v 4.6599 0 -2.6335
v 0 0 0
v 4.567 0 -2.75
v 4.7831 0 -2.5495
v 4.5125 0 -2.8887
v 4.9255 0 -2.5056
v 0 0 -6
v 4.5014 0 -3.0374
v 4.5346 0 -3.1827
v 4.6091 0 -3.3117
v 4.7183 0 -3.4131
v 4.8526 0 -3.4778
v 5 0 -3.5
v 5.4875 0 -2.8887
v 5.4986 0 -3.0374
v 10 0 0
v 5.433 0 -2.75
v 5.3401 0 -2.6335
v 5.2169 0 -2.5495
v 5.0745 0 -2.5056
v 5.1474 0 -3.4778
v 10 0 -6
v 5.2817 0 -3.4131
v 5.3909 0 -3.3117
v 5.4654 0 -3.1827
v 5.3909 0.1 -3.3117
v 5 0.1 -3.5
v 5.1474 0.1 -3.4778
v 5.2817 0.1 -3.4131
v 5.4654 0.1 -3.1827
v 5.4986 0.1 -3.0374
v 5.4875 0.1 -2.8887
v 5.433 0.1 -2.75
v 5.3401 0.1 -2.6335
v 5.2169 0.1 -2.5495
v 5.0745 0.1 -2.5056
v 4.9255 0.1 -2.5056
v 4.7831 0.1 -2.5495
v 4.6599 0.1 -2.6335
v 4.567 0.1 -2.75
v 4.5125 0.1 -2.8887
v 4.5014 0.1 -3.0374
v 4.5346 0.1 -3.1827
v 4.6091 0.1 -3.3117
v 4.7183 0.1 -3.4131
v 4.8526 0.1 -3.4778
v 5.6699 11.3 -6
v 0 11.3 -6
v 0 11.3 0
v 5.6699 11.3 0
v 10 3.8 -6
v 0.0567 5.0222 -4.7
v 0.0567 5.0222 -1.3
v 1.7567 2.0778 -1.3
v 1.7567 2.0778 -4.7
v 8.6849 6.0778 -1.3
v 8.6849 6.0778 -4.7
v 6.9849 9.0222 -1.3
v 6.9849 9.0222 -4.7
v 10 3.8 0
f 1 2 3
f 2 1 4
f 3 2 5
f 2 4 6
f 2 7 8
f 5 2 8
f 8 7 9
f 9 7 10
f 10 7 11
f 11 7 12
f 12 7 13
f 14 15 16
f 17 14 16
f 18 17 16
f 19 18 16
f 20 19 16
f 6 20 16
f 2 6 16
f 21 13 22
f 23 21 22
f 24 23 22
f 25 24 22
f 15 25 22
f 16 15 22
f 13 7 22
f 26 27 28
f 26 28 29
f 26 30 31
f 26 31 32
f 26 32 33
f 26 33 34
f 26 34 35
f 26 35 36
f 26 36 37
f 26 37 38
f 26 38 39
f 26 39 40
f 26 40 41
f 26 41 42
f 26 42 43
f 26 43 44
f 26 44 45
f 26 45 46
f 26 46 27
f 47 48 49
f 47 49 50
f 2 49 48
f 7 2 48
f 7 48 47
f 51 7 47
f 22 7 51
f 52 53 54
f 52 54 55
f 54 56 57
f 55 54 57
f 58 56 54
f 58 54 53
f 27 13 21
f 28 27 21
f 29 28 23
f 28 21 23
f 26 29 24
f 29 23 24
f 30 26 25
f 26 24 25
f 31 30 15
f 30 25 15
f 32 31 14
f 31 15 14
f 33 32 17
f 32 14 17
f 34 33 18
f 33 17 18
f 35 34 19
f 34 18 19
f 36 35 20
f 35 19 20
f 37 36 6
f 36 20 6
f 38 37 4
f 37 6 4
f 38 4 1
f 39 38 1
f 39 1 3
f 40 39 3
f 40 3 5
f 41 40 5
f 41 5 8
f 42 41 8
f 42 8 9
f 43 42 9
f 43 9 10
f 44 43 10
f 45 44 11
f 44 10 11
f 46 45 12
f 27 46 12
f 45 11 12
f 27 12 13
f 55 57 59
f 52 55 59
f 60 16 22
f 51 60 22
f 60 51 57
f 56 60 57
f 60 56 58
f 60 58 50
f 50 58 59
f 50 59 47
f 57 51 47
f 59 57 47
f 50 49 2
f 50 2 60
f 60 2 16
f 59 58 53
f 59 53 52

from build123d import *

# Parameters (mm, degrees)
SKETCH_1_W          = 10
SKETCH_1_H          = 6
EXTRUDE_1_DEPTH     = 11.3
CUT_EXTRUDE_1_REACH = 18.239
SKETCH_3_W          = 3.4
SKETCH_3_H          = 3.4
CUT_EXTRUDE_2_DEPTH = 8
SKETCH_4_R          = 0.5
CUT_EXTRUDE_3_DEPTH = 0.1


with BuildPart() as part:
    # 草图1 → 凸台-拉伸1 (new body)
    with BuildSketch(Plane(origin=(0, 0, 0), x_dir=(1, 0, 0), z_dir=(0, 1, 0))):
        with Locations((5, 3)):
            Rectangle(SKETCH_1_W, SKETCH_1_H)
    extrude(amount=EXTRUDE_1_DEPTH)

    # 草图2 → 切除-拉伸1 (cut, up to next)
    with BuildSketch(Plane(origin=(0, 0, -6), x_dir=(-1, 0, 0), z_dir=(0, 0, -1)), mode=Mode.PRIVATE) as cut_extrude_1_sk1:
        Polygon((-10, 3.8), (-5.669872981, 11.3), (-10, 11.3), align=None)
    cut_extrude_1_tool1 = extrude(cut_extrude_1_sk1.sketch, amount=-CUT_EXTRUDE_1_REACH, mode=Mode.PRIVATE) & part.part
    add(cut_extrude_1_tool1.solids().sort_by_distance((8.556624, 8.8, -6))[0], mode=Mode.SUBTRACT)

    # 草图3 → 切除-拉伸2 (cut)
    with BuildSketch(Plane(origin=(9.145448267, 5.280127019, 0), x_dir=(0, 0, -1), z_dir=(0.8660254037844417, 0.4999999999999948, 0))):
        with Locations((3, 2.621023553)):
            Rectangle(SKETCH_3_W, SKETCH_3_H)
    extrude(amount=-CUT_EXTRUDE_2_DEPTH, mode=Mode.SUBTRACT)

    # 草图4 → 切除-拉伸3 (cut)
    with BuildSketch(Plane.XZ):
        with Locations(Location((5, -3, 0), (0, 0, 270))):
            Circle(SKETCH_4_R)
    extrude(amount=-CUT_EXTRUDE_3_DEPTH, mode=Mode.SUBTRACT)


solid = part.part
